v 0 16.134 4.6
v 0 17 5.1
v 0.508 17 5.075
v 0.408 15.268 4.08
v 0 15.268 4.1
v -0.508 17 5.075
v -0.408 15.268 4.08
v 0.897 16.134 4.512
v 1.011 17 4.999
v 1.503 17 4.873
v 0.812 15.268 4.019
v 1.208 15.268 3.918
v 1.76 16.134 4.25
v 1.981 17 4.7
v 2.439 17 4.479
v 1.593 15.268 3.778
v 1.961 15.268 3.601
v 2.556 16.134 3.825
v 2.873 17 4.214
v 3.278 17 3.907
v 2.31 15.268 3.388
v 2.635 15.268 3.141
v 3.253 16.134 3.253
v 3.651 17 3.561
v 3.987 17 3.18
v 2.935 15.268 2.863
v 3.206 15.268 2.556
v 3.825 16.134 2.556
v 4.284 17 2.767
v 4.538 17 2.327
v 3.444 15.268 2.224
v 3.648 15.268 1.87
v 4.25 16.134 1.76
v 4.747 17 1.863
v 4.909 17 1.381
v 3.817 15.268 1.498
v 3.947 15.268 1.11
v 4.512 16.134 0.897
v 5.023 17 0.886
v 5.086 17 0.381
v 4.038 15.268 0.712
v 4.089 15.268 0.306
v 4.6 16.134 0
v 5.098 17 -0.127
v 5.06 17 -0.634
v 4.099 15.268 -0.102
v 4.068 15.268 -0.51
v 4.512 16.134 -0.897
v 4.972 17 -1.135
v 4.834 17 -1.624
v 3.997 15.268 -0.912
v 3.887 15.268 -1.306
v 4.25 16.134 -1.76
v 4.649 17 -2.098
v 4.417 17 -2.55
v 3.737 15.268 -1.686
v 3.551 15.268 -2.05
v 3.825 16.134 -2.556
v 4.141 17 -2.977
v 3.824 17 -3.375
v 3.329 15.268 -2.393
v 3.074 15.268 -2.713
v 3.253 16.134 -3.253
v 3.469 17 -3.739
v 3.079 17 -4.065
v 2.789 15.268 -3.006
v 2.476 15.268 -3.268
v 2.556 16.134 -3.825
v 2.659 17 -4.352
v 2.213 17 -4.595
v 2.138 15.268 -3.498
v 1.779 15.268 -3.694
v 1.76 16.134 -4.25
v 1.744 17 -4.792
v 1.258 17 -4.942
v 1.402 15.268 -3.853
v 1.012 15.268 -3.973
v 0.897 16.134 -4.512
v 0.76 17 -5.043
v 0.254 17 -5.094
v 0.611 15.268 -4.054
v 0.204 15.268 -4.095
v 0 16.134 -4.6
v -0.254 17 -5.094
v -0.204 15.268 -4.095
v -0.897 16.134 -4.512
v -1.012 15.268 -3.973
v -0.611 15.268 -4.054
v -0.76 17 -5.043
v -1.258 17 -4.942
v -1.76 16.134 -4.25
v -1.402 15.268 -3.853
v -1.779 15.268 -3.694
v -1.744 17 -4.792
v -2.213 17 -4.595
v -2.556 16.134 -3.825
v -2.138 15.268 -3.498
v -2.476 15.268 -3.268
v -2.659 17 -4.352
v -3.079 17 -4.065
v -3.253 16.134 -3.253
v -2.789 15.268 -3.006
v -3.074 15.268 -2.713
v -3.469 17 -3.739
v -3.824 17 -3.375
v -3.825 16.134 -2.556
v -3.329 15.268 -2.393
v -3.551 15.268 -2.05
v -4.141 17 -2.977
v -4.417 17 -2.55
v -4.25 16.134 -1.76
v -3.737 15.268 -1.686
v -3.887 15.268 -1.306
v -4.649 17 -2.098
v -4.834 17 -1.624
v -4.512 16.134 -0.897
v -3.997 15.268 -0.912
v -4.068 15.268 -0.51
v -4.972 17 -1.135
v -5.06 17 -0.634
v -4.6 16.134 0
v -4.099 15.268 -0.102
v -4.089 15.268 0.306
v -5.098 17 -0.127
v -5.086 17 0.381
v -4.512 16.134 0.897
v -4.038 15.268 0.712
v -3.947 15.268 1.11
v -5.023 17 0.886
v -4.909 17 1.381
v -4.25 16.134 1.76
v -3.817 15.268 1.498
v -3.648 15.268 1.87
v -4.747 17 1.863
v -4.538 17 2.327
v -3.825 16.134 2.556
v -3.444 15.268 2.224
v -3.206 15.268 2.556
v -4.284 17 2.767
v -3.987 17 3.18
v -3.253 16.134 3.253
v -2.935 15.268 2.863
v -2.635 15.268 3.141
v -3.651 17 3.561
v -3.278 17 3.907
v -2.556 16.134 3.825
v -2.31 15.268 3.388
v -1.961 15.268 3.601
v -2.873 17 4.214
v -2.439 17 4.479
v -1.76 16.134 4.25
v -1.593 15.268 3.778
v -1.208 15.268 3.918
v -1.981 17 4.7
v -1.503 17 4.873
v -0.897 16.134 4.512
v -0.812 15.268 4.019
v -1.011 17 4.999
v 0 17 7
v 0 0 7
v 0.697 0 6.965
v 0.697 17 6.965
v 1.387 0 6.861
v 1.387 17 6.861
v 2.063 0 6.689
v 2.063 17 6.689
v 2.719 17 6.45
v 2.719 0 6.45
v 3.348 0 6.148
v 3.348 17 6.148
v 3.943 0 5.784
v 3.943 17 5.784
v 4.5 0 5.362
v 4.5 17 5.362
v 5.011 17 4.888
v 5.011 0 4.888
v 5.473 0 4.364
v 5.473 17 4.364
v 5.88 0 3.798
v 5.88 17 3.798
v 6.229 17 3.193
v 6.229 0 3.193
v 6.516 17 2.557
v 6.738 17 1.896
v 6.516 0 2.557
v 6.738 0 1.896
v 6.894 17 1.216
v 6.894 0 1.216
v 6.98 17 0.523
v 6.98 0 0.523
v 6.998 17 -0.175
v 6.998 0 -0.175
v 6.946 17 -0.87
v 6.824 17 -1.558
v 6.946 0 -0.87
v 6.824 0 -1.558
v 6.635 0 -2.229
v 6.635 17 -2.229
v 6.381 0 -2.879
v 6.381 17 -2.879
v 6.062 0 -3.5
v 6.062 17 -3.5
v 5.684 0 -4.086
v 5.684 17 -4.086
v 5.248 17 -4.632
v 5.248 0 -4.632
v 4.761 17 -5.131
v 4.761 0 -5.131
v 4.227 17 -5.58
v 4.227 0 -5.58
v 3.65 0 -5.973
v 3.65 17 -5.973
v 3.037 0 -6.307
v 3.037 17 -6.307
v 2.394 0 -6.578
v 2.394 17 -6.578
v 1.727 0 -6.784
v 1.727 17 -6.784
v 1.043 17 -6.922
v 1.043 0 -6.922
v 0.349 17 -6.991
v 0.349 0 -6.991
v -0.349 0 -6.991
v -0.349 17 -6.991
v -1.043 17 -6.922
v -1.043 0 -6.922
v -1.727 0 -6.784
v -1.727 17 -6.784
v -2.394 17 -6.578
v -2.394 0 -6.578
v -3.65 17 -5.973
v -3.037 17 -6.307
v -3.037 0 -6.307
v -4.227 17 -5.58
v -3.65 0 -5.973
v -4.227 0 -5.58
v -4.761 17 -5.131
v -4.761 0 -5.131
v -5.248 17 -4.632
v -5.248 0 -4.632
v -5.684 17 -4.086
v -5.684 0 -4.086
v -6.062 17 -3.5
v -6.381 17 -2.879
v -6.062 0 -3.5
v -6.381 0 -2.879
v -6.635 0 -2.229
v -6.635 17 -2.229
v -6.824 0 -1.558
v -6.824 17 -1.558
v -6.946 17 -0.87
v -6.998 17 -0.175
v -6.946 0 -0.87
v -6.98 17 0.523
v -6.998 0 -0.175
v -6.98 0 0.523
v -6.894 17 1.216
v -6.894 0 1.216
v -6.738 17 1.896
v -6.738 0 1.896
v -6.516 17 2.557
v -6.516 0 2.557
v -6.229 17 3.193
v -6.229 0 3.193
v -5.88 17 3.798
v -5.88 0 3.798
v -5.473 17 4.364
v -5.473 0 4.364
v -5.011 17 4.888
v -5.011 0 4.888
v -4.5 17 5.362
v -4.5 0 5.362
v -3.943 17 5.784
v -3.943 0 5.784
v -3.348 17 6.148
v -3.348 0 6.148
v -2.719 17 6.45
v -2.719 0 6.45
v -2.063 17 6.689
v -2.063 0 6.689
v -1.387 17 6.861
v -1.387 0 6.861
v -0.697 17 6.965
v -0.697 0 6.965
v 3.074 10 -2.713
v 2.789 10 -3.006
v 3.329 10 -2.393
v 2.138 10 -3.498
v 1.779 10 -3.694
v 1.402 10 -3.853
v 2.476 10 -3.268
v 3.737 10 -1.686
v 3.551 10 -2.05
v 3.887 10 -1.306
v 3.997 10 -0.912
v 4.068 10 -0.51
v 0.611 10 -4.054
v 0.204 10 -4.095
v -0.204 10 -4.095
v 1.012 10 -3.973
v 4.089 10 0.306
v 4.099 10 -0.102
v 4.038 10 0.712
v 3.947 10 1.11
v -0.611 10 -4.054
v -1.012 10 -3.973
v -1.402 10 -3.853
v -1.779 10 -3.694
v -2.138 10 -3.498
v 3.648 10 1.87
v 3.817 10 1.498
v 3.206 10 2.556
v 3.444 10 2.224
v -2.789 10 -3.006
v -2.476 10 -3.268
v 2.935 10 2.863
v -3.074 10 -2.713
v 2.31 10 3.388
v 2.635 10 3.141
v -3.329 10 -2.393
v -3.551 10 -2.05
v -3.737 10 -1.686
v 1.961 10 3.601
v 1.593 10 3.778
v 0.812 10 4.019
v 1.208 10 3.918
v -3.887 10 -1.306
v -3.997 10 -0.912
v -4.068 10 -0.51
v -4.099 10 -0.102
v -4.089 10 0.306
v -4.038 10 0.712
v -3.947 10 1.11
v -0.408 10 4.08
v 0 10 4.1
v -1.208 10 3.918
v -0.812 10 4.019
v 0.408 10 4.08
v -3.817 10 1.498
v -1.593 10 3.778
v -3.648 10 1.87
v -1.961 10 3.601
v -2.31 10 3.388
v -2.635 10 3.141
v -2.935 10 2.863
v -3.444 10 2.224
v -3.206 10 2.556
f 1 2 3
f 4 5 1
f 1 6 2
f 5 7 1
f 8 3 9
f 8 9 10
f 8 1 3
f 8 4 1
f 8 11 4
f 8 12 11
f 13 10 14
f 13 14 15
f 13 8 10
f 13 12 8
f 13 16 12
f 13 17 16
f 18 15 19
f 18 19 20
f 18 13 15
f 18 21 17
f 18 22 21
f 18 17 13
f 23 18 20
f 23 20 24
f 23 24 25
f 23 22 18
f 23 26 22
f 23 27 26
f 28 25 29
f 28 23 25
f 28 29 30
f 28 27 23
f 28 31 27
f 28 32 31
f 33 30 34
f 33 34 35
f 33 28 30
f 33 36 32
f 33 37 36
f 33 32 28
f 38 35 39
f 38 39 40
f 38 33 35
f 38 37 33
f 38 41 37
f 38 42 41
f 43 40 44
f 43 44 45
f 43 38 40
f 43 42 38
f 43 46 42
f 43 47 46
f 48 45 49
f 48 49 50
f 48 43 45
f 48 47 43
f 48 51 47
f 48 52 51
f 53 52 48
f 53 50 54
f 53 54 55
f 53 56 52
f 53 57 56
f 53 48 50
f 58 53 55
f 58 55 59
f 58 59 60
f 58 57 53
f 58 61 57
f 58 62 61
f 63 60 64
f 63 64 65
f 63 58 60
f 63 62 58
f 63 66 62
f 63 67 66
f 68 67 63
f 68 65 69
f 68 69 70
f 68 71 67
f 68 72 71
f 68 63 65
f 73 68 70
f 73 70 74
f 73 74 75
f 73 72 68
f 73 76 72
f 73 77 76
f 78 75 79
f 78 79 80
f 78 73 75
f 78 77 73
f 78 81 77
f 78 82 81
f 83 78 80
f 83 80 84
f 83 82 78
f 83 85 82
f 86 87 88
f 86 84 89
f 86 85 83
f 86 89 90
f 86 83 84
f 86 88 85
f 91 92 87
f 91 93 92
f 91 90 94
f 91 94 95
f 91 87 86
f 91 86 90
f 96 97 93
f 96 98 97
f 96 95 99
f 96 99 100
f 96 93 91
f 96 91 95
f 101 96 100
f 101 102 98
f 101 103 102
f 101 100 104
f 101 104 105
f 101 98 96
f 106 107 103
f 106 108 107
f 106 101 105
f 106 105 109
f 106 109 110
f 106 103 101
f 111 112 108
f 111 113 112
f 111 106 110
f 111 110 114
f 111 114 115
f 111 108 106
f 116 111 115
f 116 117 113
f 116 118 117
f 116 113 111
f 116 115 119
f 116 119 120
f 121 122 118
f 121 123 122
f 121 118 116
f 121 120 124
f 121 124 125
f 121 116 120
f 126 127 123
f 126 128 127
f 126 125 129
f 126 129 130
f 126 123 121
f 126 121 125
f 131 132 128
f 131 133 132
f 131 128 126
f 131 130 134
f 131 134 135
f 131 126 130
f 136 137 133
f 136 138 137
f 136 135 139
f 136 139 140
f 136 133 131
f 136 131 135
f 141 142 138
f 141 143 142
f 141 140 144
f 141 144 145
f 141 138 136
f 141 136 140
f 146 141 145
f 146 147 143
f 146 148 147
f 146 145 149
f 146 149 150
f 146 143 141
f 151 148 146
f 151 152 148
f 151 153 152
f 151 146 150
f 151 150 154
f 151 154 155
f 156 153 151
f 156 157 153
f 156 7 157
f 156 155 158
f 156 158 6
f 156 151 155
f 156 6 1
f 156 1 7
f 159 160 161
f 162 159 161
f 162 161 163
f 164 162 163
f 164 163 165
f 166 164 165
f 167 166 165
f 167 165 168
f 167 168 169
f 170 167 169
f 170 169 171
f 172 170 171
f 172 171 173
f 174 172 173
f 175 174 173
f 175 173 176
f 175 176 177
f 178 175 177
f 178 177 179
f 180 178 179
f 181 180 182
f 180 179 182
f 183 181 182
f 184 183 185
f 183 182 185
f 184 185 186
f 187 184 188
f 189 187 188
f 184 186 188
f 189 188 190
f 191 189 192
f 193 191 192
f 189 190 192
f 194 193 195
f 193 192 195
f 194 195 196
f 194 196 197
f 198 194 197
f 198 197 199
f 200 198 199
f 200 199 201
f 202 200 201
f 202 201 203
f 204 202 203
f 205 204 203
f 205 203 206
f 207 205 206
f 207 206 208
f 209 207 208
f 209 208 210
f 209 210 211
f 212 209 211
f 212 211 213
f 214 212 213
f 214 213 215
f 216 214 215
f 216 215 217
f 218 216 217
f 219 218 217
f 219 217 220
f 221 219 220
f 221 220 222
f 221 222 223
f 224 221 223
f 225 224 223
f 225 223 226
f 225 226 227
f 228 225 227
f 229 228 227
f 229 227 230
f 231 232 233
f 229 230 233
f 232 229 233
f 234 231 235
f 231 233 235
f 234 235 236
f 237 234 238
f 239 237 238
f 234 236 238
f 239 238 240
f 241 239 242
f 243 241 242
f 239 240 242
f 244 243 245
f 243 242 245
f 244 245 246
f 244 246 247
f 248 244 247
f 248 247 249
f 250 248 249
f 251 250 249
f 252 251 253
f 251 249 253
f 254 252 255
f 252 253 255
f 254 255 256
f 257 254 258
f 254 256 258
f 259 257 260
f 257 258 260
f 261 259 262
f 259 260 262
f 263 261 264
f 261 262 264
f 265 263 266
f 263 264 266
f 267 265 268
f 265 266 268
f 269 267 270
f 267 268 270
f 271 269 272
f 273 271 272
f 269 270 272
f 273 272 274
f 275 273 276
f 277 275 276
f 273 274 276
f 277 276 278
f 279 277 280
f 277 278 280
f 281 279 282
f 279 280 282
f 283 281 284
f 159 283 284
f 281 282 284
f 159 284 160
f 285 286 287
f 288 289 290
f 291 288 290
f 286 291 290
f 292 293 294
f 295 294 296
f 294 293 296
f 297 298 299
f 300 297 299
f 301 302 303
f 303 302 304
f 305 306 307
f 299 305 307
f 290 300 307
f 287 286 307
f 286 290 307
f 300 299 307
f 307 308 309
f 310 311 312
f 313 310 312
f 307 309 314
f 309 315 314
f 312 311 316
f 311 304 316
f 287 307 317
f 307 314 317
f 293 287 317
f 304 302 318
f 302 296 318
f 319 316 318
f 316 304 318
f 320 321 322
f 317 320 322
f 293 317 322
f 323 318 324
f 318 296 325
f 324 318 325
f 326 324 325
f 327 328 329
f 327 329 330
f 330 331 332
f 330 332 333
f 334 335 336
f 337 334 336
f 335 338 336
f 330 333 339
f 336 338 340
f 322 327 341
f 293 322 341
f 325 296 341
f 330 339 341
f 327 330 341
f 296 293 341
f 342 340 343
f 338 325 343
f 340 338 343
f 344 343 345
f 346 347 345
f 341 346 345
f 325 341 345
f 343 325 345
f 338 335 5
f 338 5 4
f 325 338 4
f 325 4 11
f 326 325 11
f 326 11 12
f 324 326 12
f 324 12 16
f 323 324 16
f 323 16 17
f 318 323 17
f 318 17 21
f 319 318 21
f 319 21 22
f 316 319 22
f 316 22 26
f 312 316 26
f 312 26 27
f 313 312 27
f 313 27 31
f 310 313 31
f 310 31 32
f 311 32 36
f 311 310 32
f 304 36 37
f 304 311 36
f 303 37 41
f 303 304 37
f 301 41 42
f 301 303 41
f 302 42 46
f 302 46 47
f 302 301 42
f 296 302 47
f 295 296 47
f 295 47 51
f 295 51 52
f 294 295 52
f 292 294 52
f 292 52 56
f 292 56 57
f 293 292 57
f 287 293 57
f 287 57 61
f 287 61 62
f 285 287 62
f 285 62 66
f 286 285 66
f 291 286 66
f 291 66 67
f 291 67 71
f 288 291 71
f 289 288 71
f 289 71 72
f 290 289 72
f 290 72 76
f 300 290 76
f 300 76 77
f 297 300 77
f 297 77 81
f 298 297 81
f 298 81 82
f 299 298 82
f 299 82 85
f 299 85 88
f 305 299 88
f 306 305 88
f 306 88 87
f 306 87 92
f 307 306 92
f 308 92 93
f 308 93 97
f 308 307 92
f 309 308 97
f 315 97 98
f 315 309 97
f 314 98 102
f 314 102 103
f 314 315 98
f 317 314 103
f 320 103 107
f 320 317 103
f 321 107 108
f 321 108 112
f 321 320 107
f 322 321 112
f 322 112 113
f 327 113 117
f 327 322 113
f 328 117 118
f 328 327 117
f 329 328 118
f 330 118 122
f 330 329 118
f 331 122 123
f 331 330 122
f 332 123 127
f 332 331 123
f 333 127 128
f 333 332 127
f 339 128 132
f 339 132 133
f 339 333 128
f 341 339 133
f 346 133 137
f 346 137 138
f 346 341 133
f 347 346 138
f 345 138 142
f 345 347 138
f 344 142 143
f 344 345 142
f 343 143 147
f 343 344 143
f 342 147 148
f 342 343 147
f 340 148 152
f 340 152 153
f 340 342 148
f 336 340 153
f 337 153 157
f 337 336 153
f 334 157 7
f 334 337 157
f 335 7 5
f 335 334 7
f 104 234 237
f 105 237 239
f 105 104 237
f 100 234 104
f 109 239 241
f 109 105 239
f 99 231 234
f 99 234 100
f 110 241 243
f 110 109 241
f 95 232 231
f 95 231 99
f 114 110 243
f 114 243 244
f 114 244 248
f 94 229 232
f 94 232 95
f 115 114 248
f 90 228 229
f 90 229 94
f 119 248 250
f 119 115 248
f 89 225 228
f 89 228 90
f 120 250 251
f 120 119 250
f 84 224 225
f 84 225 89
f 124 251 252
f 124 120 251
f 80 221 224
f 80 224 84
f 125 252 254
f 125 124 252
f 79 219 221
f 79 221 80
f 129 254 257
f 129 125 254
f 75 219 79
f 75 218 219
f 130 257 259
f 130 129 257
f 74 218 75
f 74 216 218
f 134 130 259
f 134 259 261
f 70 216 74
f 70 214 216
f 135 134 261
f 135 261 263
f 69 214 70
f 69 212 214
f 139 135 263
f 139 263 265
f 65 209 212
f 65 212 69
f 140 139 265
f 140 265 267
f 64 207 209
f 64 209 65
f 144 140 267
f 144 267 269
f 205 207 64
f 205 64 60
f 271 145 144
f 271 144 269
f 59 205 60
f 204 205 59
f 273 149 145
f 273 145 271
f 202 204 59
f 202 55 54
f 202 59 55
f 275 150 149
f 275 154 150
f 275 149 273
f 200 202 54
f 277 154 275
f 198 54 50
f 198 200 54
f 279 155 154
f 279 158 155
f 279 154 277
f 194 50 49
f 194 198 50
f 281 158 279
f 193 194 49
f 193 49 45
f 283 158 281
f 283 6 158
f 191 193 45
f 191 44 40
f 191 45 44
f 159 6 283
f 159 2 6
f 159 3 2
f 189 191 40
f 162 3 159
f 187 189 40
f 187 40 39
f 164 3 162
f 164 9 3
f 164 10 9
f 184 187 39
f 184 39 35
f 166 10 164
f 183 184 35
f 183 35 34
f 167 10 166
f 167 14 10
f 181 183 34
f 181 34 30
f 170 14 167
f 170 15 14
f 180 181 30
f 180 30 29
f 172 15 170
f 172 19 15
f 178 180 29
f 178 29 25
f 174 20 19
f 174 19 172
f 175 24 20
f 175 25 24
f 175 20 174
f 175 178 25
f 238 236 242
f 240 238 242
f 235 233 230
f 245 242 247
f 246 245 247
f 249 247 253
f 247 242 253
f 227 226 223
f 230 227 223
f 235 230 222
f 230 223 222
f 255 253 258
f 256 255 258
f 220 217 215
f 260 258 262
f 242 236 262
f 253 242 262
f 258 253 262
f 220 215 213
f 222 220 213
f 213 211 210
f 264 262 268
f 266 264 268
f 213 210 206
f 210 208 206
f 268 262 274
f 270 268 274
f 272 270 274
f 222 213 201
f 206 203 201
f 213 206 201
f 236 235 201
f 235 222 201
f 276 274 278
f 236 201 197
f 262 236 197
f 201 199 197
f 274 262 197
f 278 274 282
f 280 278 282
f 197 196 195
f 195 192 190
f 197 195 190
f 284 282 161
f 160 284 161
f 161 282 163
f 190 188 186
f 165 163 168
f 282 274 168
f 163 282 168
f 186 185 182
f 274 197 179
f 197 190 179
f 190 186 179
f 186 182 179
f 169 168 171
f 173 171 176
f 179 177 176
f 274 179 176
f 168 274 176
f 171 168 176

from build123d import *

# Parameters (mm, degrees)
SKETCH_1_R      = 7
SKETCH_1_R_2    = 4.1
EXTRUDE_1_DEPTH = 17
SKETCH_2_R      = 7
EXTRUDE_2_DEPTH = 10
CHAMFER_1_SIZE  = 1
CHAMFER_1_SIZE2 = 1.732050808


with BuildPart() as part:
    # Эскиз1 → Бобышка-Вытянуть1 (new body)
    with BuildSketch(Plane(origin=(0, 0, 0), x_dir=(1, 0, 0), z_dir=(0, 1, 0))):
        with Locations(Location((0, 0, 0), (0, 0, 270))):
            Circle(SKETCH_1_R)
        with Locations(Location((0, 0, 0), (0, 0, 270))):
            Circle(SKETCH_1_R_2, mode=Mode.SUBTRACT)
    extrude(amount=EXTRUDE_1_DEPTH)

    # Эскиз2 → Бобышка-Вытянуть2 (add)
    with BuildSketch(Plane.XZ):
        with Locations(Location((0, 0, 0), (0, 0, 90))):
            Circle(SKETCH_2_R)
    extrude(amount=-EXTRUDE_2_DEPTH)

    # Фаска1
    chamfer_1_edges = [part.edges().sort_by_distance(p)[0] for p in [
        (0, 17, -4.1),
    ]]
    chamfer_1_side = [part.faces().sort_by_distance(p)[0] for p in [
        (0, 17, -6.802010101),
    ]]
    chamfer(chamfer_1_edges, length=CHAMFER_1_SIZE, length2=CHAMFER_1_SIZE2, reference=chamfer_1_side[0])


solid = part.part
